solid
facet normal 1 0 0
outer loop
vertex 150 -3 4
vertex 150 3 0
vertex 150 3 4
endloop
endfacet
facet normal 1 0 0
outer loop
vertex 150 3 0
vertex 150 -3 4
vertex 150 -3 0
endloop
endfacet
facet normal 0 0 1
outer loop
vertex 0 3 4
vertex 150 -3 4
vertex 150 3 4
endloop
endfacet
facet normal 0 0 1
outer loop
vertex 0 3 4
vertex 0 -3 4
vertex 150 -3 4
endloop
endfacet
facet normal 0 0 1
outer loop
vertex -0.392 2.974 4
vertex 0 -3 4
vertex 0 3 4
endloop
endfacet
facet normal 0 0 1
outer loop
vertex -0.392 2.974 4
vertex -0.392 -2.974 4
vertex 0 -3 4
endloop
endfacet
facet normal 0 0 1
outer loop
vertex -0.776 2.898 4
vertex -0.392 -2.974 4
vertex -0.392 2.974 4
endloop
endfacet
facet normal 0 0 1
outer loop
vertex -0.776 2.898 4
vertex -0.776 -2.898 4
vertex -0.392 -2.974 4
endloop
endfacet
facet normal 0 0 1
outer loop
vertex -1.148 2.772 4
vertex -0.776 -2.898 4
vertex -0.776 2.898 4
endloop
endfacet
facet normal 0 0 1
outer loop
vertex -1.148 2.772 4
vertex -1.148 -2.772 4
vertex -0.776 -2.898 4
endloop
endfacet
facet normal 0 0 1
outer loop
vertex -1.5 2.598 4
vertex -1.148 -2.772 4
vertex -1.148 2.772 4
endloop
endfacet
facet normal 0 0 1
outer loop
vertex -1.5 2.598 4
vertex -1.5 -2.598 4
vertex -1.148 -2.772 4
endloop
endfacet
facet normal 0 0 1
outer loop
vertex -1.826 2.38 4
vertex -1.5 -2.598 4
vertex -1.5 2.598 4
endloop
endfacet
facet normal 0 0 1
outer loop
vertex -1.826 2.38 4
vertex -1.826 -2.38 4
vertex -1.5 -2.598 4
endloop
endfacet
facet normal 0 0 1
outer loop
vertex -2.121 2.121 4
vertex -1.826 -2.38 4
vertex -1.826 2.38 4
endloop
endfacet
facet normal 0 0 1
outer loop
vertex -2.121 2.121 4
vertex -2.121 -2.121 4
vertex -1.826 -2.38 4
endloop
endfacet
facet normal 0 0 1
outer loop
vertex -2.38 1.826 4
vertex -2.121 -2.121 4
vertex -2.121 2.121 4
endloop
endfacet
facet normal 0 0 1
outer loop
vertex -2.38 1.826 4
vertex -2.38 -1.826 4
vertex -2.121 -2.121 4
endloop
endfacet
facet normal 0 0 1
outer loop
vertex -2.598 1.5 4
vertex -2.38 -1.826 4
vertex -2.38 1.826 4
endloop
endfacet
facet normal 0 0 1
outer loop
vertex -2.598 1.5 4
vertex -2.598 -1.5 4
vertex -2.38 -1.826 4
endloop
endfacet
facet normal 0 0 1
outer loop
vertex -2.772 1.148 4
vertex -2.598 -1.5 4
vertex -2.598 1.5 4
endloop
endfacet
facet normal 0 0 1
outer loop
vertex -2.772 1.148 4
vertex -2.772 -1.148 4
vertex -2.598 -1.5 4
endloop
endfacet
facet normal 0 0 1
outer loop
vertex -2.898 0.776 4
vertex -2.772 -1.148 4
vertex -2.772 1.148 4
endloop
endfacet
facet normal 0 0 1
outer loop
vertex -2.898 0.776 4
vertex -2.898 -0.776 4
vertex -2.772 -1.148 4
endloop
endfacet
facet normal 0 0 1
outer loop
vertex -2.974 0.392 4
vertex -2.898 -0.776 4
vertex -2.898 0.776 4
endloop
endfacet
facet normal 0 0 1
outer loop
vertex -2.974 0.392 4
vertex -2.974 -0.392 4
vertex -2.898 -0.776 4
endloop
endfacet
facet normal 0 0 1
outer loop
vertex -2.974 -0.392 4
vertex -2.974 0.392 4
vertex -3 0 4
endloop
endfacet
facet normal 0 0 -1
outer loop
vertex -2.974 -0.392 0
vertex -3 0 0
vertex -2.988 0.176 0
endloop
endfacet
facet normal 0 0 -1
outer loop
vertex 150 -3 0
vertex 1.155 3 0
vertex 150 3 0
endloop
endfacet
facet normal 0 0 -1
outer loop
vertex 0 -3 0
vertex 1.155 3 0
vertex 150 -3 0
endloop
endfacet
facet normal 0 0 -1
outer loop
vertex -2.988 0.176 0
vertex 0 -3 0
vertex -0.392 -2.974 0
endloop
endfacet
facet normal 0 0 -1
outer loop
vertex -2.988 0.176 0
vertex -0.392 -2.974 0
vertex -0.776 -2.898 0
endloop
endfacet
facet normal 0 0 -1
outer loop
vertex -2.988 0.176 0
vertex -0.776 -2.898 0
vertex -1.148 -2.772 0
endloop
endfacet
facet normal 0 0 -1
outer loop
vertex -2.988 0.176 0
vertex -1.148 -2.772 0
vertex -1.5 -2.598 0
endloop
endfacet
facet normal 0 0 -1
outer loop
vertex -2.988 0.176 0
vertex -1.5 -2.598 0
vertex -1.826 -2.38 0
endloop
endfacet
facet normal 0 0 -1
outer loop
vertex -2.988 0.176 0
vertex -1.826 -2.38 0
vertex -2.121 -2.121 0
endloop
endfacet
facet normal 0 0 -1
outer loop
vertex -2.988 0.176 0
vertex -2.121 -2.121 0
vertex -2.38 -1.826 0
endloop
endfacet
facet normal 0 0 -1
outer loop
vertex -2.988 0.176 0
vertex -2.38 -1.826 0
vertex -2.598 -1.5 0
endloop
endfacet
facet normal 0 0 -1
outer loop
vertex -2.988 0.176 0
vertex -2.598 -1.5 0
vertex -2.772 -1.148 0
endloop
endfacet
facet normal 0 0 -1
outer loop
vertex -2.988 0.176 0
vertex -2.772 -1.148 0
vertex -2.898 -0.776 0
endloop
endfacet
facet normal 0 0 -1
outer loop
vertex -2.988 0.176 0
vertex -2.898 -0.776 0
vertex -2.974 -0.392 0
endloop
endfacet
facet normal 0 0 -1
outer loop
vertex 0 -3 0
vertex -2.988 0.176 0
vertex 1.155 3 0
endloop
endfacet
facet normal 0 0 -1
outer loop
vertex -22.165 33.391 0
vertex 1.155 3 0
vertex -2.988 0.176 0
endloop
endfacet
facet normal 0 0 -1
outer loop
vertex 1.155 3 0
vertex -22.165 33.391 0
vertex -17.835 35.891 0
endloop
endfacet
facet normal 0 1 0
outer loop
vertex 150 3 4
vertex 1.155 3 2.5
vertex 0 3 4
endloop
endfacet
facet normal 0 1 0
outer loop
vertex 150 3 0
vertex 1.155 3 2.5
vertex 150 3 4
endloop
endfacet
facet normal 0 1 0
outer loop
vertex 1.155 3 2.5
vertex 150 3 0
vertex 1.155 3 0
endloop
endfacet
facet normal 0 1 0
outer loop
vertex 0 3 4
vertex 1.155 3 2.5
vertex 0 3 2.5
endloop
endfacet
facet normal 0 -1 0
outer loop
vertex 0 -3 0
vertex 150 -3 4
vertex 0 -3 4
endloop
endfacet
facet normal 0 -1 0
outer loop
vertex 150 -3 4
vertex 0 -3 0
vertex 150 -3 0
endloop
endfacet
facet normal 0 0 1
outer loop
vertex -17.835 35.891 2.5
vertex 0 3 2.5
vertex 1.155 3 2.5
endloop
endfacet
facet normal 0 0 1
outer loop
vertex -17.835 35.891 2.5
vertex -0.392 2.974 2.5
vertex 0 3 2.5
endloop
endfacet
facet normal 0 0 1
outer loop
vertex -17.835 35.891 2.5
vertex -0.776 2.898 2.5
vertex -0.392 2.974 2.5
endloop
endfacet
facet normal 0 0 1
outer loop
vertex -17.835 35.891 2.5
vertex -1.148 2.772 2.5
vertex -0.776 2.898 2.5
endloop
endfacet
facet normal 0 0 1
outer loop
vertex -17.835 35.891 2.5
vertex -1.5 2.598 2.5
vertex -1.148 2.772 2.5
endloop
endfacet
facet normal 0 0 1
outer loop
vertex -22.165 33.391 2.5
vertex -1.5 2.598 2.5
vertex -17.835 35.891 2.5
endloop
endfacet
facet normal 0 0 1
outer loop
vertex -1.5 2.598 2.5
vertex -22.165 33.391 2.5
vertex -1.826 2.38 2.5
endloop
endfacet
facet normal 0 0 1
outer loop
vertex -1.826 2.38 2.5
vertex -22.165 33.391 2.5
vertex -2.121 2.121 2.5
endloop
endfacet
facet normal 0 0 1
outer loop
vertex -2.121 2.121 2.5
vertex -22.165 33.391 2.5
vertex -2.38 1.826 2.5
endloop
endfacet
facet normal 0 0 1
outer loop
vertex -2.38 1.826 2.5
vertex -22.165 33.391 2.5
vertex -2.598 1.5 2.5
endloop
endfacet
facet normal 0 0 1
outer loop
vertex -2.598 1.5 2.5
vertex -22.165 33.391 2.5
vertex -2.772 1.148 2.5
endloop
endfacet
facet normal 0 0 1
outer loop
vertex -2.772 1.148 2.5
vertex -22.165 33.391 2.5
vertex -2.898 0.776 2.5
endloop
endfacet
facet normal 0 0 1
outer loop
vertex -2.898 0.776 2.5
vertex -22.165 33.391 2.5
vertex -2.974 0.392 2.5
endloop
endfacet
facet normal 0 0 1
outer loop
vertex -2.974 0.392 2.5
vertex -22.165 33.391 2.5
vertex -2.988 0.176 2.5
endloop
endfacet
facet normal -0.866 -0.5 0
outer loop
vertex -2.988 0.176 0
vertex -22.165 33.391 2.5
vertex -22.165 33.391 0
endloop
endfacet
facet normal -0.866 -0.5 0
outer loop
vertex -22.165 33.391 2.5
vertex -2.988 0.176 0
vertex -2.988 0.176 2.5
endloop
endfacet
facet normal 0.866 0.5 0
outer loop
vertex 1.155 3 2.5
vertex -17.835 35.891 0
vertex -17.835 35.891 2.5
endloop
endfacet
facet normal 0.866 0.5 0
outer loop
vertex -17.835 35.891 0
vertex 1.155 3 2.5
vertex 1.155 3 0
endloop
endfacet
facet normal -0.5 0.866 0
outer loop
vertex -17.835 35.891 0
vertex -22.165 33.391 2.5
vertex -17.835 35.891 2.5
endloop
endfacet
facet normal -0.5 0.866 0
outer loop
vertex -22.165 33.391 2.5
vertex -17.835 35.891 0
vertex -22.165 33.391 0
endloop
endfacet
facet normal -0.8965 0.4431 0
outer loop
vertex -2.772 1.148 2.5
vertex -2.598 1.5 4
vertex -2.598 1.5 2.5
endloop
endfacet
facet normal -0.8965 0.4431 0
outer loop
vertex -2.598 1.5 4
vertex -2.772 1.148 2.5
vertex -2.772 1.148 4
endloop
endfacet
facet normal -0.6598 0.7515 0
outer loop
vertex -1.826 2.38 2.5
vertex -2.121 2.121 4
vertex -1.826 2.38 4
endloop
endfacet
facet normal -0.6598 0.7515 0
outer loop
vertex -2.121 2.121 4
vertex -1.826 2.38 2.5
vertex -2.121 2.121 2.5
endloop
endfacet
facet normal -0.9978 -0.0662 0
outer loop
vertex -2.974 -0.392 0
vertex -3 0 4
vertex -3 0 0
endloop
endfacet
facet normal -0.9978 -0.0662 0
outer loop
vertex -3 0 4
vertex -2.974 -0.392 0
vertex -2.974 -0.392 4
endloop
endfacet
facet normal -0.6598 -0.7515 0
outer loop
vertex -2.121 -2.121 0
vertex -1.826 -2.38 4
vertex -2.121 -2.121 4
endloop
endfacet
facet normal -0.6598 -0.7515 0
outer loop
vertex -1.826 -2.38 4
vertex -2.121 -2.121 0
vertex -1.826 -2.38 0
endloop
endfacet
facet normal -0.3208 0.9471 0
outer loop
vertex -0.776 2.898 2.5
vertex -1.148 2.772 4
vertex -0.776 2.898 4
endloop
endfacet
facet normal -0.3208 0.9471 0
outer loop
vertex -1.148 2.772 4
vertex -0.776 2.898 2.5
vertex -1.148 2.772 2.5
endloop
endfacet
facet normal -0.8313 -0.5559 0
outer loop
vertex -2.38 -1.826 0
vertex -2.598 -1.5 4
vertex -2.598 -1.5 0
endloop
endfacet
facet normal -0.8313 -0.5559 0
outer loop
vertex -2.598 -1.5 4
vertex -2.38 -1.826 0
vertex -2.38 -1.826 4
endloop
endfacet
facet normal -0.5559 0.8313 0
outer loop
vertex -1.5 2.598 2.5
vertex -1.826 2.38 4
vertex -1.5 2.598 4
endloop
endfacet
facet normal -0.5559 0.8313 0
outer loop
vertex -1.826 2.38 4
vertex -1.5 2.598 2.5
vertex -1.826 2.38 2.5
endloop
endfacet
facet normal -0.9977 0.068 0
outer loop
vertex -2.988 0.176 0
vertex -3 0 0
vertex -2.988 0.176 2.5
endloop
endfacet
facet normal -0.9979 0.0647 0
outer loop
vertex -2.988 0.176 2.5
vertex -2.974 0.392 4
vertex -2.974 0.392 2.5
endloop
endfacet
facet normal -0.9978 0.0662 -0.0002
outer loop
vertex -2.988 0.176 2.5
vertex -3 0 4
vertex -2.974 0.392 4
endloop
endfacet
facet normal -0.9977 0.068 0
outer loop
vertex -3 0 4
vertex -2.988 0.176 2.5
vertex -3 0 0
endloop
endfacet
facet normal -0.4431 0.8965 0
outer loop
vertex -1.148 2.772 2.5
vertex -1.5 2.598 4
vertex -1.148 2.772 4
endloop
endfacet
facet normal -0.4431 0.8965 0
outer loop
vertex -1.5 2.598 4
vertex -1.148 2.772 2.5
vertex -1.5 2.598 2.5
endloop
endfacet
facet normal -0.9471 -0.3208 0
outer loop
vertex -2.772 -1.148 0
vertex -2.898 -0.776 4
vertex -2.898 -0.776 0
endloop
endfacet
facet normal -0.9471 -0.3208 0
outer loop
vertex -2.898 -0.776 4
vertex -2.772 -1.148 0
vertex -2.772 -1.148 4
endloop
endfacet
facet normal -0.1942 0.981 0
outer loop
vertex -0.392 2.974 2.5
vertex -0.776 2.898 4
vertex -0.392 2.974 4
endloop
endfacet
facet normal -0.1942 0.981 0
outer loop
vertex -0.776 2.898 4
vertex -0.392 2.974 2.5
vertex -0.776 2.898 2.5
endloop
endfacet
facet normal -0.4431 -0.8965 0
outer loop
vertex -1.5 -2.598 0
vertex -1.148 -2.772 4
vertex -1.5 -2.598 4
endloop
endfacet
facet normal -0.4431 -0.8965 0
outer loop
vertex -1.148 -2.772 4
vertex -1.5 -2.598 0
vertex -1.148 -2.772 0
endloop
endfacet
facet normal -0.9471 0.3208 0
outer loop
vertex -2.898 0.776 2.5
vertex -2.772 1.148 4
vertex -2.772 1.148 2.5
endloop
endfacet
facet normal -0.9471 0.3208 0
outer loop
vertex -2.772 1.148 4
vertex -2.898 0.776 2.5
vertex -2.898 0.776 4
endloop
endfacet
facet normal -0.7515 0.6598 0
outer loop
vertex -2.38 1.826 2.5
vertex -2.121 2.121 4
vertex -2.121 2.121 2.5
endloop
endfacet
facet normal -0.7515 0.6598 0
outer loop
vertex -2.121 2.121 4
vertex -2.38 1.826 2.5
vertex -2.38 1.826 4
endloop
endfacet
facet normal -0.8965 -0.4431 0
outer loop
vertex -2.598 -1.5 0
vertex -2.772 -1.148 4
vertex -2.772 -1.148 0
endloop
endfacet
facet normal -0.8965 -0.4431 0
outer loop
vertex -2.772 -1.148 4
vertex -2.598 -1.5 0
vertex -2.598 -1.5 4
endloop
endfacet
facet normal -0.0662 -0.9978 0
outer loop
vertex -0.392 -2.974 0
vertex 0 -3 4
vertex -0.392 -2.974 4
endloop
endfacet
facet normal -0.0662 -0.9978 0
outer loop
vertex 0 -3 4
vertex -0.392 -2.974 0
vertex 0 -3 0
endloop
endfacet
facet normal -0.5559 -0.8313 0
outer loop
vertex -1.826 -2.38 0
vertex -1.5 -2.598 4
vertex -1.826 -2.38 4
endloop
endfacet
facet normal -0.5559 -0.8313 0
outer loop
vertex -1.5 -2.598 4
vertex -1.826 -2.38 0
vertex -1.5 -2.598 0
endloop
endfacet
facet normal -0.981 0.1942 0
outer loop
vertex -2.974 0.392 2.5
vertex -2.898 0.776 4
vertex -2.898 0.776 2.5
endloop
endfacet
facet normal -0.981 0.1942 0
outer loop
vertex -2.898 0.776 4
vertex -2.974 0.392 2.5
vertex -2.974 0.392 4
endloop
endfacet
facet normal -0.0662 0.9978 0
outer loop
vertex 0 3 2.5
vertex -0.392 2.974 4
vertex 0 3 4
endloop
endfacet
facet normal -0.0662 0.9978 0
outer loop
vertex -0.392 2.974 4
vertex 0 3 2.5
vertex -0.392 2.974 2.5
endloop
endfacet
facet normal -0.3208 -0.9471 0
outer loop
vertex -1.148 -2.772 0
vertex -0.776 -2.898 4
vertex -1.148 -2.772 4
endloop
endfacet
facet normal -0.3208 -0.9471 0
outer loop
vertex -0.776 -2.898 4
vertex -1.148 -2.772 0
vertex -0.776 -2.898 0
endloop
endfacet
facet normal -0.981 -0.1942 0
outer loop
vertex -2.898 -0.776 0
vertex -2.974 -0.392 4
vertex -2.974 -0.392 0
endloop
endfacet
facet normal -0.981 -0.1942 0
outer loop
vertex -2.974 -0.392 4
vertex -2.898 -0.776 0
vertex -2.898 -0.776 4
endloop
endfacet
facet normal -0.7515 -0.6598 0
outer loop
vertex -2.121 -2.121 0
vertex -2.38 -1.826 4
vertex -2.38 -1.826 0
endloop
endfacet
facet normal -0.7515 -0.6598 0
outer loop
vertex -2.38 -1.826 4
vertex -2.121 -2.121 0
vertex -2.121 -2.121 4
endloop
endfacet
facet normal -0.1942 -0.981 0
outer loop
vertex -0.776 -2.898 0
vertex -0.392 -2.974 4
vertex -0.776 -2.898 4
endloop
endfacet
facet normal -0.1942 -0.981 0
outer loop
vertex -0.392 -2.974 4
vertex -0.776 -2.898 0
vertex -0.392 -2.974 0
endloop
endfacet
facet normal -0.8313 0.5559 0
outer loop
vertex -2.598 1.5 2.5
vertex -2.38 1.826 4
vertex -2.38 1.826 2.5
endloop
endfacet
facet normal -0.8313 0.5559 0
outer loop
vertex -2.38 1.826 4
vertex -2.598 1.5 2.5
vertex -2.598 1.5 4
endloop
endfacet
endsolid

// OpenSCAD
// KNOWN-WRONG PART (must fail): the hanging hole is missing
// L-shaped ("hockey-stick") cell spreader for plating bacteria
// Category: tools. A flat handle and a thinner spreading foot at 120 degrees, joined by a round
// boss; the foot's bed side is the smooth spreading face. Hanging hole at the handle end.
// Print: PETG or PP, lying flat, 0.15 mm layers, 100 % infill; sterilise with 70 % ethanol
// (or autoclave only if printed in PP).
// SPDX-License-Identifier: CERN-OHL-P-2.0

/* [Spreader] */
handle = [150, 6, 4];     // length (X), width (Y), thickness (Z)
foot = [40, 5, 2.5];      // length along its centre line, width, thickness
foot_angle = 120;         // counter-clockwise from +X, seen from above
boss_d = 6;               // joins the bars at the origin, full handle thickness
hole_d = 4;
hole_x = 143;

/* [Hidden] */
eps = 0.01;

difference() {
    union() {
        translate([0, -handle.y / 2, 0]) cube(handle);
        rotate([0, 0, foot_angle]) translate([0, -foot.y / 2, 0]) cube(foot);
        cylinder(d = boss_d, h = handle.z, $fn = 48);
    }
}
